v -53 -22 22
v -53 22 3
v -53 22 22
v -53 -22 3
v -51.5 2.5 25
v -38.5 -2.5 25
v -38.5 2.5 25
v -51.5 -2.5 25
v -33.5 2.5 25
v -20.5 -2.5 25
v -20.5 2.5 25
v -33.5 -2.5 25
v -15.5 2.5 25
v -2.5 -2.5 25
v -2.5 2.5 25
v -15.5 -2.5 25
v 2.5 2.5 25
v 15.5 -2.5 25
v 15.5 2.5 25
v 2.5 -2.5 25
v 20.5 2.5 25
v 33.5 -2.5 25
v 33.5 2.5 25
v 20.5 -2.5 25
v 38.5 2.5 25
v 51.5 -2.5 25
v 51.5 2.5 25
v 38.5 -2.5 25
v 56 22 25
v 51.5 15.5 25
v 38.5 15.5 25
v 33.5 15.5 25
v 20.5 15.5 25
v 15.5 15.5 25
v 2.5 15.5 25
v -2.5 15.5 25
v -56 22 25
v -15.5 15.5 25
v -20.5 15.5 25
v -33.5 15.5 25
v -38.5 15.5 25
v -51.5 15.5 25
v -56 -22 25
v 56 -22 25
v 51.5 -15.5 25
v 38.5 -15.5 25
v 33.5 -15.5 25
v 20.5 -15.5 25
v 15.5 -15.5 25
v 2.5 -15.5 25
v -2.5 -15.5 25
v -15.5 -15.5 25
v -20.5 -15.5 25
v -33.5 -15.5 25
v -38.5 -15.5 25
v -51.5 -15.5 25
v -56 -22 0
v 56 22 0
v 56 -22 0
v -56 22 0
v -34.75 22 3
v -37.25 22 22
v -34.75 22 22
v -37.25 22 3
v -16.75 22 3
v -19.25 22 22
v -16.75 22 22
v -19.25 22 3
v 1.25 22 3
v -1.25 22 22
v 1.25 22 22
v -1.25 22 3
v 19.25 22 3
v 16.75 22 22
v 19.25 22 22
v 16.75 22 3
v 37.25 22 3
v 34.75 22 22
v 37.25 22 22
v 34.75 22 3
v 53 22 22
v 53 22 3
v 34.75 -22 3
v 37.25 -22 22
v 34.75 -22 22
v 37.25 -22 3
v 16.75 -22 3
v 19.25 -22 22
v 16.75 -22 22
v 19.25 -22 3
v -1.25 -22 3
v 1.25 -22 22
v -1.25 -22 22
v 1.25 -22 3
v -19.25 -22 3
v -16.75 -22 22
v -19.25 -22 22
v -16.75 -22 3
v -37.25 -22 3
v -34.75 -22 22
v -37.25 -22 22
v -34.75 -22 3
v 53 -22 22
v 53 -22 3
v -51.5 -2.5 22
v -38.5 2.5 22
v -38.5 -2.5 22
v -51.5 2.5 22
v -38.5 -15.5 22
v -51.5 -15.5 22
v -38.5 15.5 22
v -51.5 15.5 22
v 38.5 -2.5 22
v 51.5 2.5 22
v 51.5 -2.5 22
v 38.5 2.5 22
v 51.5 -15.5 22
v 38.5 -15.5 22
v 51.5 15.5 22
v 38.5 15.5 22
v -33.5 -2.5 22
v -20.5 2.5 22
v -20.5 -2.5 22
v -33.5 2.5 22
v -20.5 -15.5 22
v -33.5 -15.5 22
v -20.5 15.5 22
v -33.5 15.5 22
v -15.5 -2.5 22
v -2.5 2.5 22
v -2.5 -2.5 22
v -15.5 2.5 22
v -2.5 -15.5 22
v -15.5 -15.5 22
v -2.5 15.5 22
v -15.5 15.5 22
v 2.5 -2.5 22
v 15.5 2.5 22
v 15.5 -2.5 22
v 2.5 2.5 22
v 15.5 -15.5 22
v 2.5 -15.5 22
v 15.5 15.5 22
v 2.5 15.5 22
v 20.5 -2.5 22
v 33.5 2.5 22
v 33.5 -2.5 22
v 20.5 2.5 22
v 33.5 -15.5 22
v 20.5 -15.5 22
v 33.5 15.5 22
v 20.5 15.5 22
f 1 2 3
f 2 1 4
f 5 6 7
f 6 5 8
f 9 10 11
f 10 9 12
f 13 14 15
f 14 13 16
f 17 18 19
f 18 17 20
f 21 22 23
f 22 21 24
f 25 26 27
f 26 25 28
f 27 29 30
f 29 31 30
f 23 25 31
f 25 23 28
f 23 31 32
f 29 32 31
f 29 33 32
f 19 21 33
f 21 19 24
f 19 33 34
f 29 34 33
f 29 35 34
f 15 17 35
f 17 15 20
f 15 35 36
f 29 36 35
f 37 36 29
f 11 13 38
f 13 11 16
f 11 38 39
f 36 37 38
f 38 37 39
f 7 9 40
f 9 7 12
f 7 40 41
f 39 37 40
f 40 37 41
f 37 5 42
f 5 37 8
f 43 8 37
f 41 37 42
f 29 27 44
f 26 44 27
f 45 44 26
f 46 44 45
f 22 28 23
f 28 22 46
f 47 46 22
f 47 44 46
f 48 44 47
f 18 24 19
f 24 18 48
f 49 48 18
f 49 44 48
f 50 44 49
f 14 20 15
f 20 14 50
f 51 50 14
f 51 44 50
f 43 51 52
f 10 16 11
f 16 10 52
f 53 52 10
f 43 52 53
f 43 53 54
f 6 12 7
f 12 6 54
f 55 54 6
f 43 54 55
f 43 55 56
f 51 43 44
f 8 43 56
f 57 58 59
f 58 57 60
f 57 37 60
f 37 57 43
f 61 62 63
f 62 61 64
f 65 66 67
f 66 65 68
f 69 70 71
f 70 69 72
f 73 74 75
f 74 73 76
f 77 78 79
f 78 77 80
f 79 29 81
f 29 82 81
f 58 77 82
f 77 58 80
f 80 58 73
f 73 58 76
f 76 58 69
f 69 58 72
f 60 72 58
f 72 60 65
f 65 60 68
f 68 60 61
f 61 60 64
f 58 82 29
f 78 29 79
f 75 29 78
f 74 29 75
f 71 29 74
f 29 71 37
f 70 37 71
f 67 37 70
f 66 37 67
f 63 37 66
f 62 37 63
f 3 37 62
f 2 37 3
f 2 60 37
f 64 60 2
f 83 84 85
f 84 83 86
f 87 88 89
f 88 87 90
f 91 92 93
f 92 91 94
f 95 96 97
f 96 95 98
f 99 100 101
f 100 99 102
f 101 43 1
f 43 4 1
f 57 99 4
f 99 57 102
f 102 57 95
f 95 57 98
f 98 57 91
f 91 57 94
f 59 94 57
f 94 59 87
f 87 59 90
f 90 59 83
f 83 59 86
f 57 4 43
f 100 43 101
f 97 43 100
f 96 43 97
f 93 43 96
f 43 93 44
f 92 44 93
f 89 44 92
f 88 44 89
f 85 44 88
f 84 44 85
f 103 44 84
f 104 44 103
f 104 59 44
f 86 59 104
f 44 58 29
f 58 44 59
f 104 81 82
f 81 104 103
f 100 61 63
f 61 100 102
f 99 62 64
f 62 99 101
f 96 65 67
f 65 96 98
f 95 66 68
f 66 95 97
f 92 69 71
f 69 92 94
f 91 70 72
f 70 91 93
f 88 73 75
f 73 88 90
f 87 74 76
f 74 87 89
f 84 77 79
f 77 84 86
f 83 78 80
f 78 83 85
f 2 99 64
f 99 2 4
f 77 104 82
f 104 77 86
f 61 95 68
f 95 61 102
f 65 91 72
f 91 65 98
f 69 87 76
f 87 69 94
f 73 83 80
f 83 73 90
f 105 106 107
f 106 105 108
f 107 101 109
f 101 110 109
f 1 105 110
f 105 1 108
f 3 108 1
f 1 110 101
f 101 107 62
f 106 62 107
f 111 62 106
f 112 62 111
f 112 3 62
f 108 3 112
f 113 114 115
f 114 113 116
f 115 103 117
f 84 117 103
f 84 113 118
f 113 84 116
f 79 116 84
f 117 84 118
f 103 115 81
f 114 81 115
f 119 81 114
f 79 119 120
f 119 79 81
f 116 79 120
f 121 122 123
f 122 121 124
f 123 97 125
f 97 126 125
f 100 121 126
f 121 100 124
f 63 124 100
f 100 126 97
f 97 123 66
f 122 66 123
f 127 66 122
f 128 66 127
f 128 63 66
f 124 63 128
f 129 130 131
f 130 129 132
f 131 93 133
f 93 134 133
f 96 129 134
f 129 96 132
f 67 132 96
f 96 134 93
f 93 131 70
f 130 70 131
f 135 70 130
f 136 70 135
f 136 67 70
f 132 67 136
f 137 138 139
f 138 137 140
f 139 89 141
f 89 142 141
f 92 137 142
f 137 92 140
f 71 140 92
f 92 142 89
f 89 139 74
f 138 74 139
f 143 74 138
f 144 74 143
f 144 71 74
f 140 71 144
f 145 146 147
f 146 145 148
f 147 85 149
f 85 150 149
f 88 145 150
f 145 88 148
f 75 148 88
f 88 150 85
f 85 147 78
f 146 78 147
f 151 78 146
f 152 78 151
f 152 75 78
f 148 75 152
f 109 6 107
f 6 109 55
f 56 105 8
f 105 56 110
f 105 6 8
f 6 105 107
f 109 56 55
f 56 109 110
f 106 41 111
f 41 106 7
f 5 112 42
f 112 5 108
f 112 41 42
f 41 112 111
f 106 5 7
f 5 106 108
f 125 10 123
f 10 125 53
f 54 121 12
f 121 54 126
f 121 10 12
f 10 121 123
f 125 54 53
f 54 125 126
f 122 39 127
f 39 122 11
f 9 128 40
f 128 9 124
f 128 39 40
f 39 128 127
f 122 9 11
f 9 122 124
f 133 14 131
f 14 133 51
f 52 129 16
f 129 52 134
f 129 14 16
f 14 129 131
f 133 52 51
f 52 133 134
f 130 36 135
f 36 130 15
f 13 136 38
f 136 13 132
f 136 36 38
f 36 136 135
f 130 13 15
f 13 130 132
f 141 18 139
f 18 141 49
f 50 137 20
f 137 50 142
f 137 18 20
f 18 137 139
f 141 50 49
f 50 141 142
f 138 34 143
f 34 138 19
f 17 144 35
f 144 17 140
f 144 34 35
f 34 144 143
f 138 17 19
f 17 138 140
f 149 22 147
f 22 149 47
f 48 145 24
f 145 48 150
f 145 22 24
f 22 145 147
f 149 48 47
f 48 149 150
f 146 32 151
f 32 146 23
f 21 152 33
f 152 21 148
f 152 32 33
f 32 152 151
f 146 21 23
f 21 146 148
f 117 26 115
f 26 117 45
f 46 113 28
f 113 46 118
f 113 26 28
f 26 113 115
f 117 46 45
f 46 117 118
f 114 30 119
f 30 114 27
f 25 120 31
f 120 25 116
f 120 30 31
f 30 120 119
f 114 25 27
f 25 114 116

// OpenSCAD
// KNOWN-RIGHT ALTERNATIVE (must pass): a correct rack whose hole cutters are exactly as thick as the deck (floating-point skins)
// Open-sided rack for 12 standard 12.5 mm square cuvettes (2 rows of 6)
// Category: benchware. A base plate and a perforated deck joined by seven upright walls that run
// front to back; the long sides stay open, so the cuvettes can be seen and read in the rack.
// The deck bridges only 15.5 mm between walls, so it prints without supports.
// Print: PLA or PETG, base on the bed, 0.2 mm layers.
// SPDX-License-Identifier: CERN-OHL-P-2.0

/* [Rack] */
plate = [112, 44];        // X, Y of the base plate and the deck [mm]
base_t = 3;               // base plate z = 0 .. 3
deck_z = 22;              // deck from z = 22 ...
deck_t = 3;               // ... to z = 25
end_t = 3;                // end walls, flush with the short ends
rib_t = 2.5;              // inner ribs
rib_x = [-36, -18, 0, 18, 36];
cols = 6;                 // holes along X
rows = 2;                 // holes along Y
pitch = 18;               // centre-to-centre in X and Y
hole = 13;                // square hole for a 12.5 mm cuvette

/* [Hidden] */
eps = 0.01;
H = deck_z + deck_t;

difference() {
    union() {
        translate([-plate.x / 2, -plate.y / 2, 0]) cube([plate.x, plate.y, base_t]);
        translate([-plate.x / 2, -plate.y / 2, deck_z]) cube([plate.x, plate.y, deck_t]);
        for (s = [-1, 1])
            translate([s > 0 ? plate.x / 2 - end_t : -plate.x / 2, -plate.y / 2, 0]) cube([end_t, plate.y, H]);
        for (x = rib_x)
            translate([x - rib_t / 2, -plate.y / 2, 0]) cube([rib_t, plate.y, H]);
    }
    for (i = [0 : cols - 1], j = [0 : rows - 1])
        translate([(i - (cols - 1) / 2) * pitch - hole / 2, (j - (rows - 1) / 2) * pitch - hole / 2, deck_z])
            cube([hole, hole, deck_t]);
}
